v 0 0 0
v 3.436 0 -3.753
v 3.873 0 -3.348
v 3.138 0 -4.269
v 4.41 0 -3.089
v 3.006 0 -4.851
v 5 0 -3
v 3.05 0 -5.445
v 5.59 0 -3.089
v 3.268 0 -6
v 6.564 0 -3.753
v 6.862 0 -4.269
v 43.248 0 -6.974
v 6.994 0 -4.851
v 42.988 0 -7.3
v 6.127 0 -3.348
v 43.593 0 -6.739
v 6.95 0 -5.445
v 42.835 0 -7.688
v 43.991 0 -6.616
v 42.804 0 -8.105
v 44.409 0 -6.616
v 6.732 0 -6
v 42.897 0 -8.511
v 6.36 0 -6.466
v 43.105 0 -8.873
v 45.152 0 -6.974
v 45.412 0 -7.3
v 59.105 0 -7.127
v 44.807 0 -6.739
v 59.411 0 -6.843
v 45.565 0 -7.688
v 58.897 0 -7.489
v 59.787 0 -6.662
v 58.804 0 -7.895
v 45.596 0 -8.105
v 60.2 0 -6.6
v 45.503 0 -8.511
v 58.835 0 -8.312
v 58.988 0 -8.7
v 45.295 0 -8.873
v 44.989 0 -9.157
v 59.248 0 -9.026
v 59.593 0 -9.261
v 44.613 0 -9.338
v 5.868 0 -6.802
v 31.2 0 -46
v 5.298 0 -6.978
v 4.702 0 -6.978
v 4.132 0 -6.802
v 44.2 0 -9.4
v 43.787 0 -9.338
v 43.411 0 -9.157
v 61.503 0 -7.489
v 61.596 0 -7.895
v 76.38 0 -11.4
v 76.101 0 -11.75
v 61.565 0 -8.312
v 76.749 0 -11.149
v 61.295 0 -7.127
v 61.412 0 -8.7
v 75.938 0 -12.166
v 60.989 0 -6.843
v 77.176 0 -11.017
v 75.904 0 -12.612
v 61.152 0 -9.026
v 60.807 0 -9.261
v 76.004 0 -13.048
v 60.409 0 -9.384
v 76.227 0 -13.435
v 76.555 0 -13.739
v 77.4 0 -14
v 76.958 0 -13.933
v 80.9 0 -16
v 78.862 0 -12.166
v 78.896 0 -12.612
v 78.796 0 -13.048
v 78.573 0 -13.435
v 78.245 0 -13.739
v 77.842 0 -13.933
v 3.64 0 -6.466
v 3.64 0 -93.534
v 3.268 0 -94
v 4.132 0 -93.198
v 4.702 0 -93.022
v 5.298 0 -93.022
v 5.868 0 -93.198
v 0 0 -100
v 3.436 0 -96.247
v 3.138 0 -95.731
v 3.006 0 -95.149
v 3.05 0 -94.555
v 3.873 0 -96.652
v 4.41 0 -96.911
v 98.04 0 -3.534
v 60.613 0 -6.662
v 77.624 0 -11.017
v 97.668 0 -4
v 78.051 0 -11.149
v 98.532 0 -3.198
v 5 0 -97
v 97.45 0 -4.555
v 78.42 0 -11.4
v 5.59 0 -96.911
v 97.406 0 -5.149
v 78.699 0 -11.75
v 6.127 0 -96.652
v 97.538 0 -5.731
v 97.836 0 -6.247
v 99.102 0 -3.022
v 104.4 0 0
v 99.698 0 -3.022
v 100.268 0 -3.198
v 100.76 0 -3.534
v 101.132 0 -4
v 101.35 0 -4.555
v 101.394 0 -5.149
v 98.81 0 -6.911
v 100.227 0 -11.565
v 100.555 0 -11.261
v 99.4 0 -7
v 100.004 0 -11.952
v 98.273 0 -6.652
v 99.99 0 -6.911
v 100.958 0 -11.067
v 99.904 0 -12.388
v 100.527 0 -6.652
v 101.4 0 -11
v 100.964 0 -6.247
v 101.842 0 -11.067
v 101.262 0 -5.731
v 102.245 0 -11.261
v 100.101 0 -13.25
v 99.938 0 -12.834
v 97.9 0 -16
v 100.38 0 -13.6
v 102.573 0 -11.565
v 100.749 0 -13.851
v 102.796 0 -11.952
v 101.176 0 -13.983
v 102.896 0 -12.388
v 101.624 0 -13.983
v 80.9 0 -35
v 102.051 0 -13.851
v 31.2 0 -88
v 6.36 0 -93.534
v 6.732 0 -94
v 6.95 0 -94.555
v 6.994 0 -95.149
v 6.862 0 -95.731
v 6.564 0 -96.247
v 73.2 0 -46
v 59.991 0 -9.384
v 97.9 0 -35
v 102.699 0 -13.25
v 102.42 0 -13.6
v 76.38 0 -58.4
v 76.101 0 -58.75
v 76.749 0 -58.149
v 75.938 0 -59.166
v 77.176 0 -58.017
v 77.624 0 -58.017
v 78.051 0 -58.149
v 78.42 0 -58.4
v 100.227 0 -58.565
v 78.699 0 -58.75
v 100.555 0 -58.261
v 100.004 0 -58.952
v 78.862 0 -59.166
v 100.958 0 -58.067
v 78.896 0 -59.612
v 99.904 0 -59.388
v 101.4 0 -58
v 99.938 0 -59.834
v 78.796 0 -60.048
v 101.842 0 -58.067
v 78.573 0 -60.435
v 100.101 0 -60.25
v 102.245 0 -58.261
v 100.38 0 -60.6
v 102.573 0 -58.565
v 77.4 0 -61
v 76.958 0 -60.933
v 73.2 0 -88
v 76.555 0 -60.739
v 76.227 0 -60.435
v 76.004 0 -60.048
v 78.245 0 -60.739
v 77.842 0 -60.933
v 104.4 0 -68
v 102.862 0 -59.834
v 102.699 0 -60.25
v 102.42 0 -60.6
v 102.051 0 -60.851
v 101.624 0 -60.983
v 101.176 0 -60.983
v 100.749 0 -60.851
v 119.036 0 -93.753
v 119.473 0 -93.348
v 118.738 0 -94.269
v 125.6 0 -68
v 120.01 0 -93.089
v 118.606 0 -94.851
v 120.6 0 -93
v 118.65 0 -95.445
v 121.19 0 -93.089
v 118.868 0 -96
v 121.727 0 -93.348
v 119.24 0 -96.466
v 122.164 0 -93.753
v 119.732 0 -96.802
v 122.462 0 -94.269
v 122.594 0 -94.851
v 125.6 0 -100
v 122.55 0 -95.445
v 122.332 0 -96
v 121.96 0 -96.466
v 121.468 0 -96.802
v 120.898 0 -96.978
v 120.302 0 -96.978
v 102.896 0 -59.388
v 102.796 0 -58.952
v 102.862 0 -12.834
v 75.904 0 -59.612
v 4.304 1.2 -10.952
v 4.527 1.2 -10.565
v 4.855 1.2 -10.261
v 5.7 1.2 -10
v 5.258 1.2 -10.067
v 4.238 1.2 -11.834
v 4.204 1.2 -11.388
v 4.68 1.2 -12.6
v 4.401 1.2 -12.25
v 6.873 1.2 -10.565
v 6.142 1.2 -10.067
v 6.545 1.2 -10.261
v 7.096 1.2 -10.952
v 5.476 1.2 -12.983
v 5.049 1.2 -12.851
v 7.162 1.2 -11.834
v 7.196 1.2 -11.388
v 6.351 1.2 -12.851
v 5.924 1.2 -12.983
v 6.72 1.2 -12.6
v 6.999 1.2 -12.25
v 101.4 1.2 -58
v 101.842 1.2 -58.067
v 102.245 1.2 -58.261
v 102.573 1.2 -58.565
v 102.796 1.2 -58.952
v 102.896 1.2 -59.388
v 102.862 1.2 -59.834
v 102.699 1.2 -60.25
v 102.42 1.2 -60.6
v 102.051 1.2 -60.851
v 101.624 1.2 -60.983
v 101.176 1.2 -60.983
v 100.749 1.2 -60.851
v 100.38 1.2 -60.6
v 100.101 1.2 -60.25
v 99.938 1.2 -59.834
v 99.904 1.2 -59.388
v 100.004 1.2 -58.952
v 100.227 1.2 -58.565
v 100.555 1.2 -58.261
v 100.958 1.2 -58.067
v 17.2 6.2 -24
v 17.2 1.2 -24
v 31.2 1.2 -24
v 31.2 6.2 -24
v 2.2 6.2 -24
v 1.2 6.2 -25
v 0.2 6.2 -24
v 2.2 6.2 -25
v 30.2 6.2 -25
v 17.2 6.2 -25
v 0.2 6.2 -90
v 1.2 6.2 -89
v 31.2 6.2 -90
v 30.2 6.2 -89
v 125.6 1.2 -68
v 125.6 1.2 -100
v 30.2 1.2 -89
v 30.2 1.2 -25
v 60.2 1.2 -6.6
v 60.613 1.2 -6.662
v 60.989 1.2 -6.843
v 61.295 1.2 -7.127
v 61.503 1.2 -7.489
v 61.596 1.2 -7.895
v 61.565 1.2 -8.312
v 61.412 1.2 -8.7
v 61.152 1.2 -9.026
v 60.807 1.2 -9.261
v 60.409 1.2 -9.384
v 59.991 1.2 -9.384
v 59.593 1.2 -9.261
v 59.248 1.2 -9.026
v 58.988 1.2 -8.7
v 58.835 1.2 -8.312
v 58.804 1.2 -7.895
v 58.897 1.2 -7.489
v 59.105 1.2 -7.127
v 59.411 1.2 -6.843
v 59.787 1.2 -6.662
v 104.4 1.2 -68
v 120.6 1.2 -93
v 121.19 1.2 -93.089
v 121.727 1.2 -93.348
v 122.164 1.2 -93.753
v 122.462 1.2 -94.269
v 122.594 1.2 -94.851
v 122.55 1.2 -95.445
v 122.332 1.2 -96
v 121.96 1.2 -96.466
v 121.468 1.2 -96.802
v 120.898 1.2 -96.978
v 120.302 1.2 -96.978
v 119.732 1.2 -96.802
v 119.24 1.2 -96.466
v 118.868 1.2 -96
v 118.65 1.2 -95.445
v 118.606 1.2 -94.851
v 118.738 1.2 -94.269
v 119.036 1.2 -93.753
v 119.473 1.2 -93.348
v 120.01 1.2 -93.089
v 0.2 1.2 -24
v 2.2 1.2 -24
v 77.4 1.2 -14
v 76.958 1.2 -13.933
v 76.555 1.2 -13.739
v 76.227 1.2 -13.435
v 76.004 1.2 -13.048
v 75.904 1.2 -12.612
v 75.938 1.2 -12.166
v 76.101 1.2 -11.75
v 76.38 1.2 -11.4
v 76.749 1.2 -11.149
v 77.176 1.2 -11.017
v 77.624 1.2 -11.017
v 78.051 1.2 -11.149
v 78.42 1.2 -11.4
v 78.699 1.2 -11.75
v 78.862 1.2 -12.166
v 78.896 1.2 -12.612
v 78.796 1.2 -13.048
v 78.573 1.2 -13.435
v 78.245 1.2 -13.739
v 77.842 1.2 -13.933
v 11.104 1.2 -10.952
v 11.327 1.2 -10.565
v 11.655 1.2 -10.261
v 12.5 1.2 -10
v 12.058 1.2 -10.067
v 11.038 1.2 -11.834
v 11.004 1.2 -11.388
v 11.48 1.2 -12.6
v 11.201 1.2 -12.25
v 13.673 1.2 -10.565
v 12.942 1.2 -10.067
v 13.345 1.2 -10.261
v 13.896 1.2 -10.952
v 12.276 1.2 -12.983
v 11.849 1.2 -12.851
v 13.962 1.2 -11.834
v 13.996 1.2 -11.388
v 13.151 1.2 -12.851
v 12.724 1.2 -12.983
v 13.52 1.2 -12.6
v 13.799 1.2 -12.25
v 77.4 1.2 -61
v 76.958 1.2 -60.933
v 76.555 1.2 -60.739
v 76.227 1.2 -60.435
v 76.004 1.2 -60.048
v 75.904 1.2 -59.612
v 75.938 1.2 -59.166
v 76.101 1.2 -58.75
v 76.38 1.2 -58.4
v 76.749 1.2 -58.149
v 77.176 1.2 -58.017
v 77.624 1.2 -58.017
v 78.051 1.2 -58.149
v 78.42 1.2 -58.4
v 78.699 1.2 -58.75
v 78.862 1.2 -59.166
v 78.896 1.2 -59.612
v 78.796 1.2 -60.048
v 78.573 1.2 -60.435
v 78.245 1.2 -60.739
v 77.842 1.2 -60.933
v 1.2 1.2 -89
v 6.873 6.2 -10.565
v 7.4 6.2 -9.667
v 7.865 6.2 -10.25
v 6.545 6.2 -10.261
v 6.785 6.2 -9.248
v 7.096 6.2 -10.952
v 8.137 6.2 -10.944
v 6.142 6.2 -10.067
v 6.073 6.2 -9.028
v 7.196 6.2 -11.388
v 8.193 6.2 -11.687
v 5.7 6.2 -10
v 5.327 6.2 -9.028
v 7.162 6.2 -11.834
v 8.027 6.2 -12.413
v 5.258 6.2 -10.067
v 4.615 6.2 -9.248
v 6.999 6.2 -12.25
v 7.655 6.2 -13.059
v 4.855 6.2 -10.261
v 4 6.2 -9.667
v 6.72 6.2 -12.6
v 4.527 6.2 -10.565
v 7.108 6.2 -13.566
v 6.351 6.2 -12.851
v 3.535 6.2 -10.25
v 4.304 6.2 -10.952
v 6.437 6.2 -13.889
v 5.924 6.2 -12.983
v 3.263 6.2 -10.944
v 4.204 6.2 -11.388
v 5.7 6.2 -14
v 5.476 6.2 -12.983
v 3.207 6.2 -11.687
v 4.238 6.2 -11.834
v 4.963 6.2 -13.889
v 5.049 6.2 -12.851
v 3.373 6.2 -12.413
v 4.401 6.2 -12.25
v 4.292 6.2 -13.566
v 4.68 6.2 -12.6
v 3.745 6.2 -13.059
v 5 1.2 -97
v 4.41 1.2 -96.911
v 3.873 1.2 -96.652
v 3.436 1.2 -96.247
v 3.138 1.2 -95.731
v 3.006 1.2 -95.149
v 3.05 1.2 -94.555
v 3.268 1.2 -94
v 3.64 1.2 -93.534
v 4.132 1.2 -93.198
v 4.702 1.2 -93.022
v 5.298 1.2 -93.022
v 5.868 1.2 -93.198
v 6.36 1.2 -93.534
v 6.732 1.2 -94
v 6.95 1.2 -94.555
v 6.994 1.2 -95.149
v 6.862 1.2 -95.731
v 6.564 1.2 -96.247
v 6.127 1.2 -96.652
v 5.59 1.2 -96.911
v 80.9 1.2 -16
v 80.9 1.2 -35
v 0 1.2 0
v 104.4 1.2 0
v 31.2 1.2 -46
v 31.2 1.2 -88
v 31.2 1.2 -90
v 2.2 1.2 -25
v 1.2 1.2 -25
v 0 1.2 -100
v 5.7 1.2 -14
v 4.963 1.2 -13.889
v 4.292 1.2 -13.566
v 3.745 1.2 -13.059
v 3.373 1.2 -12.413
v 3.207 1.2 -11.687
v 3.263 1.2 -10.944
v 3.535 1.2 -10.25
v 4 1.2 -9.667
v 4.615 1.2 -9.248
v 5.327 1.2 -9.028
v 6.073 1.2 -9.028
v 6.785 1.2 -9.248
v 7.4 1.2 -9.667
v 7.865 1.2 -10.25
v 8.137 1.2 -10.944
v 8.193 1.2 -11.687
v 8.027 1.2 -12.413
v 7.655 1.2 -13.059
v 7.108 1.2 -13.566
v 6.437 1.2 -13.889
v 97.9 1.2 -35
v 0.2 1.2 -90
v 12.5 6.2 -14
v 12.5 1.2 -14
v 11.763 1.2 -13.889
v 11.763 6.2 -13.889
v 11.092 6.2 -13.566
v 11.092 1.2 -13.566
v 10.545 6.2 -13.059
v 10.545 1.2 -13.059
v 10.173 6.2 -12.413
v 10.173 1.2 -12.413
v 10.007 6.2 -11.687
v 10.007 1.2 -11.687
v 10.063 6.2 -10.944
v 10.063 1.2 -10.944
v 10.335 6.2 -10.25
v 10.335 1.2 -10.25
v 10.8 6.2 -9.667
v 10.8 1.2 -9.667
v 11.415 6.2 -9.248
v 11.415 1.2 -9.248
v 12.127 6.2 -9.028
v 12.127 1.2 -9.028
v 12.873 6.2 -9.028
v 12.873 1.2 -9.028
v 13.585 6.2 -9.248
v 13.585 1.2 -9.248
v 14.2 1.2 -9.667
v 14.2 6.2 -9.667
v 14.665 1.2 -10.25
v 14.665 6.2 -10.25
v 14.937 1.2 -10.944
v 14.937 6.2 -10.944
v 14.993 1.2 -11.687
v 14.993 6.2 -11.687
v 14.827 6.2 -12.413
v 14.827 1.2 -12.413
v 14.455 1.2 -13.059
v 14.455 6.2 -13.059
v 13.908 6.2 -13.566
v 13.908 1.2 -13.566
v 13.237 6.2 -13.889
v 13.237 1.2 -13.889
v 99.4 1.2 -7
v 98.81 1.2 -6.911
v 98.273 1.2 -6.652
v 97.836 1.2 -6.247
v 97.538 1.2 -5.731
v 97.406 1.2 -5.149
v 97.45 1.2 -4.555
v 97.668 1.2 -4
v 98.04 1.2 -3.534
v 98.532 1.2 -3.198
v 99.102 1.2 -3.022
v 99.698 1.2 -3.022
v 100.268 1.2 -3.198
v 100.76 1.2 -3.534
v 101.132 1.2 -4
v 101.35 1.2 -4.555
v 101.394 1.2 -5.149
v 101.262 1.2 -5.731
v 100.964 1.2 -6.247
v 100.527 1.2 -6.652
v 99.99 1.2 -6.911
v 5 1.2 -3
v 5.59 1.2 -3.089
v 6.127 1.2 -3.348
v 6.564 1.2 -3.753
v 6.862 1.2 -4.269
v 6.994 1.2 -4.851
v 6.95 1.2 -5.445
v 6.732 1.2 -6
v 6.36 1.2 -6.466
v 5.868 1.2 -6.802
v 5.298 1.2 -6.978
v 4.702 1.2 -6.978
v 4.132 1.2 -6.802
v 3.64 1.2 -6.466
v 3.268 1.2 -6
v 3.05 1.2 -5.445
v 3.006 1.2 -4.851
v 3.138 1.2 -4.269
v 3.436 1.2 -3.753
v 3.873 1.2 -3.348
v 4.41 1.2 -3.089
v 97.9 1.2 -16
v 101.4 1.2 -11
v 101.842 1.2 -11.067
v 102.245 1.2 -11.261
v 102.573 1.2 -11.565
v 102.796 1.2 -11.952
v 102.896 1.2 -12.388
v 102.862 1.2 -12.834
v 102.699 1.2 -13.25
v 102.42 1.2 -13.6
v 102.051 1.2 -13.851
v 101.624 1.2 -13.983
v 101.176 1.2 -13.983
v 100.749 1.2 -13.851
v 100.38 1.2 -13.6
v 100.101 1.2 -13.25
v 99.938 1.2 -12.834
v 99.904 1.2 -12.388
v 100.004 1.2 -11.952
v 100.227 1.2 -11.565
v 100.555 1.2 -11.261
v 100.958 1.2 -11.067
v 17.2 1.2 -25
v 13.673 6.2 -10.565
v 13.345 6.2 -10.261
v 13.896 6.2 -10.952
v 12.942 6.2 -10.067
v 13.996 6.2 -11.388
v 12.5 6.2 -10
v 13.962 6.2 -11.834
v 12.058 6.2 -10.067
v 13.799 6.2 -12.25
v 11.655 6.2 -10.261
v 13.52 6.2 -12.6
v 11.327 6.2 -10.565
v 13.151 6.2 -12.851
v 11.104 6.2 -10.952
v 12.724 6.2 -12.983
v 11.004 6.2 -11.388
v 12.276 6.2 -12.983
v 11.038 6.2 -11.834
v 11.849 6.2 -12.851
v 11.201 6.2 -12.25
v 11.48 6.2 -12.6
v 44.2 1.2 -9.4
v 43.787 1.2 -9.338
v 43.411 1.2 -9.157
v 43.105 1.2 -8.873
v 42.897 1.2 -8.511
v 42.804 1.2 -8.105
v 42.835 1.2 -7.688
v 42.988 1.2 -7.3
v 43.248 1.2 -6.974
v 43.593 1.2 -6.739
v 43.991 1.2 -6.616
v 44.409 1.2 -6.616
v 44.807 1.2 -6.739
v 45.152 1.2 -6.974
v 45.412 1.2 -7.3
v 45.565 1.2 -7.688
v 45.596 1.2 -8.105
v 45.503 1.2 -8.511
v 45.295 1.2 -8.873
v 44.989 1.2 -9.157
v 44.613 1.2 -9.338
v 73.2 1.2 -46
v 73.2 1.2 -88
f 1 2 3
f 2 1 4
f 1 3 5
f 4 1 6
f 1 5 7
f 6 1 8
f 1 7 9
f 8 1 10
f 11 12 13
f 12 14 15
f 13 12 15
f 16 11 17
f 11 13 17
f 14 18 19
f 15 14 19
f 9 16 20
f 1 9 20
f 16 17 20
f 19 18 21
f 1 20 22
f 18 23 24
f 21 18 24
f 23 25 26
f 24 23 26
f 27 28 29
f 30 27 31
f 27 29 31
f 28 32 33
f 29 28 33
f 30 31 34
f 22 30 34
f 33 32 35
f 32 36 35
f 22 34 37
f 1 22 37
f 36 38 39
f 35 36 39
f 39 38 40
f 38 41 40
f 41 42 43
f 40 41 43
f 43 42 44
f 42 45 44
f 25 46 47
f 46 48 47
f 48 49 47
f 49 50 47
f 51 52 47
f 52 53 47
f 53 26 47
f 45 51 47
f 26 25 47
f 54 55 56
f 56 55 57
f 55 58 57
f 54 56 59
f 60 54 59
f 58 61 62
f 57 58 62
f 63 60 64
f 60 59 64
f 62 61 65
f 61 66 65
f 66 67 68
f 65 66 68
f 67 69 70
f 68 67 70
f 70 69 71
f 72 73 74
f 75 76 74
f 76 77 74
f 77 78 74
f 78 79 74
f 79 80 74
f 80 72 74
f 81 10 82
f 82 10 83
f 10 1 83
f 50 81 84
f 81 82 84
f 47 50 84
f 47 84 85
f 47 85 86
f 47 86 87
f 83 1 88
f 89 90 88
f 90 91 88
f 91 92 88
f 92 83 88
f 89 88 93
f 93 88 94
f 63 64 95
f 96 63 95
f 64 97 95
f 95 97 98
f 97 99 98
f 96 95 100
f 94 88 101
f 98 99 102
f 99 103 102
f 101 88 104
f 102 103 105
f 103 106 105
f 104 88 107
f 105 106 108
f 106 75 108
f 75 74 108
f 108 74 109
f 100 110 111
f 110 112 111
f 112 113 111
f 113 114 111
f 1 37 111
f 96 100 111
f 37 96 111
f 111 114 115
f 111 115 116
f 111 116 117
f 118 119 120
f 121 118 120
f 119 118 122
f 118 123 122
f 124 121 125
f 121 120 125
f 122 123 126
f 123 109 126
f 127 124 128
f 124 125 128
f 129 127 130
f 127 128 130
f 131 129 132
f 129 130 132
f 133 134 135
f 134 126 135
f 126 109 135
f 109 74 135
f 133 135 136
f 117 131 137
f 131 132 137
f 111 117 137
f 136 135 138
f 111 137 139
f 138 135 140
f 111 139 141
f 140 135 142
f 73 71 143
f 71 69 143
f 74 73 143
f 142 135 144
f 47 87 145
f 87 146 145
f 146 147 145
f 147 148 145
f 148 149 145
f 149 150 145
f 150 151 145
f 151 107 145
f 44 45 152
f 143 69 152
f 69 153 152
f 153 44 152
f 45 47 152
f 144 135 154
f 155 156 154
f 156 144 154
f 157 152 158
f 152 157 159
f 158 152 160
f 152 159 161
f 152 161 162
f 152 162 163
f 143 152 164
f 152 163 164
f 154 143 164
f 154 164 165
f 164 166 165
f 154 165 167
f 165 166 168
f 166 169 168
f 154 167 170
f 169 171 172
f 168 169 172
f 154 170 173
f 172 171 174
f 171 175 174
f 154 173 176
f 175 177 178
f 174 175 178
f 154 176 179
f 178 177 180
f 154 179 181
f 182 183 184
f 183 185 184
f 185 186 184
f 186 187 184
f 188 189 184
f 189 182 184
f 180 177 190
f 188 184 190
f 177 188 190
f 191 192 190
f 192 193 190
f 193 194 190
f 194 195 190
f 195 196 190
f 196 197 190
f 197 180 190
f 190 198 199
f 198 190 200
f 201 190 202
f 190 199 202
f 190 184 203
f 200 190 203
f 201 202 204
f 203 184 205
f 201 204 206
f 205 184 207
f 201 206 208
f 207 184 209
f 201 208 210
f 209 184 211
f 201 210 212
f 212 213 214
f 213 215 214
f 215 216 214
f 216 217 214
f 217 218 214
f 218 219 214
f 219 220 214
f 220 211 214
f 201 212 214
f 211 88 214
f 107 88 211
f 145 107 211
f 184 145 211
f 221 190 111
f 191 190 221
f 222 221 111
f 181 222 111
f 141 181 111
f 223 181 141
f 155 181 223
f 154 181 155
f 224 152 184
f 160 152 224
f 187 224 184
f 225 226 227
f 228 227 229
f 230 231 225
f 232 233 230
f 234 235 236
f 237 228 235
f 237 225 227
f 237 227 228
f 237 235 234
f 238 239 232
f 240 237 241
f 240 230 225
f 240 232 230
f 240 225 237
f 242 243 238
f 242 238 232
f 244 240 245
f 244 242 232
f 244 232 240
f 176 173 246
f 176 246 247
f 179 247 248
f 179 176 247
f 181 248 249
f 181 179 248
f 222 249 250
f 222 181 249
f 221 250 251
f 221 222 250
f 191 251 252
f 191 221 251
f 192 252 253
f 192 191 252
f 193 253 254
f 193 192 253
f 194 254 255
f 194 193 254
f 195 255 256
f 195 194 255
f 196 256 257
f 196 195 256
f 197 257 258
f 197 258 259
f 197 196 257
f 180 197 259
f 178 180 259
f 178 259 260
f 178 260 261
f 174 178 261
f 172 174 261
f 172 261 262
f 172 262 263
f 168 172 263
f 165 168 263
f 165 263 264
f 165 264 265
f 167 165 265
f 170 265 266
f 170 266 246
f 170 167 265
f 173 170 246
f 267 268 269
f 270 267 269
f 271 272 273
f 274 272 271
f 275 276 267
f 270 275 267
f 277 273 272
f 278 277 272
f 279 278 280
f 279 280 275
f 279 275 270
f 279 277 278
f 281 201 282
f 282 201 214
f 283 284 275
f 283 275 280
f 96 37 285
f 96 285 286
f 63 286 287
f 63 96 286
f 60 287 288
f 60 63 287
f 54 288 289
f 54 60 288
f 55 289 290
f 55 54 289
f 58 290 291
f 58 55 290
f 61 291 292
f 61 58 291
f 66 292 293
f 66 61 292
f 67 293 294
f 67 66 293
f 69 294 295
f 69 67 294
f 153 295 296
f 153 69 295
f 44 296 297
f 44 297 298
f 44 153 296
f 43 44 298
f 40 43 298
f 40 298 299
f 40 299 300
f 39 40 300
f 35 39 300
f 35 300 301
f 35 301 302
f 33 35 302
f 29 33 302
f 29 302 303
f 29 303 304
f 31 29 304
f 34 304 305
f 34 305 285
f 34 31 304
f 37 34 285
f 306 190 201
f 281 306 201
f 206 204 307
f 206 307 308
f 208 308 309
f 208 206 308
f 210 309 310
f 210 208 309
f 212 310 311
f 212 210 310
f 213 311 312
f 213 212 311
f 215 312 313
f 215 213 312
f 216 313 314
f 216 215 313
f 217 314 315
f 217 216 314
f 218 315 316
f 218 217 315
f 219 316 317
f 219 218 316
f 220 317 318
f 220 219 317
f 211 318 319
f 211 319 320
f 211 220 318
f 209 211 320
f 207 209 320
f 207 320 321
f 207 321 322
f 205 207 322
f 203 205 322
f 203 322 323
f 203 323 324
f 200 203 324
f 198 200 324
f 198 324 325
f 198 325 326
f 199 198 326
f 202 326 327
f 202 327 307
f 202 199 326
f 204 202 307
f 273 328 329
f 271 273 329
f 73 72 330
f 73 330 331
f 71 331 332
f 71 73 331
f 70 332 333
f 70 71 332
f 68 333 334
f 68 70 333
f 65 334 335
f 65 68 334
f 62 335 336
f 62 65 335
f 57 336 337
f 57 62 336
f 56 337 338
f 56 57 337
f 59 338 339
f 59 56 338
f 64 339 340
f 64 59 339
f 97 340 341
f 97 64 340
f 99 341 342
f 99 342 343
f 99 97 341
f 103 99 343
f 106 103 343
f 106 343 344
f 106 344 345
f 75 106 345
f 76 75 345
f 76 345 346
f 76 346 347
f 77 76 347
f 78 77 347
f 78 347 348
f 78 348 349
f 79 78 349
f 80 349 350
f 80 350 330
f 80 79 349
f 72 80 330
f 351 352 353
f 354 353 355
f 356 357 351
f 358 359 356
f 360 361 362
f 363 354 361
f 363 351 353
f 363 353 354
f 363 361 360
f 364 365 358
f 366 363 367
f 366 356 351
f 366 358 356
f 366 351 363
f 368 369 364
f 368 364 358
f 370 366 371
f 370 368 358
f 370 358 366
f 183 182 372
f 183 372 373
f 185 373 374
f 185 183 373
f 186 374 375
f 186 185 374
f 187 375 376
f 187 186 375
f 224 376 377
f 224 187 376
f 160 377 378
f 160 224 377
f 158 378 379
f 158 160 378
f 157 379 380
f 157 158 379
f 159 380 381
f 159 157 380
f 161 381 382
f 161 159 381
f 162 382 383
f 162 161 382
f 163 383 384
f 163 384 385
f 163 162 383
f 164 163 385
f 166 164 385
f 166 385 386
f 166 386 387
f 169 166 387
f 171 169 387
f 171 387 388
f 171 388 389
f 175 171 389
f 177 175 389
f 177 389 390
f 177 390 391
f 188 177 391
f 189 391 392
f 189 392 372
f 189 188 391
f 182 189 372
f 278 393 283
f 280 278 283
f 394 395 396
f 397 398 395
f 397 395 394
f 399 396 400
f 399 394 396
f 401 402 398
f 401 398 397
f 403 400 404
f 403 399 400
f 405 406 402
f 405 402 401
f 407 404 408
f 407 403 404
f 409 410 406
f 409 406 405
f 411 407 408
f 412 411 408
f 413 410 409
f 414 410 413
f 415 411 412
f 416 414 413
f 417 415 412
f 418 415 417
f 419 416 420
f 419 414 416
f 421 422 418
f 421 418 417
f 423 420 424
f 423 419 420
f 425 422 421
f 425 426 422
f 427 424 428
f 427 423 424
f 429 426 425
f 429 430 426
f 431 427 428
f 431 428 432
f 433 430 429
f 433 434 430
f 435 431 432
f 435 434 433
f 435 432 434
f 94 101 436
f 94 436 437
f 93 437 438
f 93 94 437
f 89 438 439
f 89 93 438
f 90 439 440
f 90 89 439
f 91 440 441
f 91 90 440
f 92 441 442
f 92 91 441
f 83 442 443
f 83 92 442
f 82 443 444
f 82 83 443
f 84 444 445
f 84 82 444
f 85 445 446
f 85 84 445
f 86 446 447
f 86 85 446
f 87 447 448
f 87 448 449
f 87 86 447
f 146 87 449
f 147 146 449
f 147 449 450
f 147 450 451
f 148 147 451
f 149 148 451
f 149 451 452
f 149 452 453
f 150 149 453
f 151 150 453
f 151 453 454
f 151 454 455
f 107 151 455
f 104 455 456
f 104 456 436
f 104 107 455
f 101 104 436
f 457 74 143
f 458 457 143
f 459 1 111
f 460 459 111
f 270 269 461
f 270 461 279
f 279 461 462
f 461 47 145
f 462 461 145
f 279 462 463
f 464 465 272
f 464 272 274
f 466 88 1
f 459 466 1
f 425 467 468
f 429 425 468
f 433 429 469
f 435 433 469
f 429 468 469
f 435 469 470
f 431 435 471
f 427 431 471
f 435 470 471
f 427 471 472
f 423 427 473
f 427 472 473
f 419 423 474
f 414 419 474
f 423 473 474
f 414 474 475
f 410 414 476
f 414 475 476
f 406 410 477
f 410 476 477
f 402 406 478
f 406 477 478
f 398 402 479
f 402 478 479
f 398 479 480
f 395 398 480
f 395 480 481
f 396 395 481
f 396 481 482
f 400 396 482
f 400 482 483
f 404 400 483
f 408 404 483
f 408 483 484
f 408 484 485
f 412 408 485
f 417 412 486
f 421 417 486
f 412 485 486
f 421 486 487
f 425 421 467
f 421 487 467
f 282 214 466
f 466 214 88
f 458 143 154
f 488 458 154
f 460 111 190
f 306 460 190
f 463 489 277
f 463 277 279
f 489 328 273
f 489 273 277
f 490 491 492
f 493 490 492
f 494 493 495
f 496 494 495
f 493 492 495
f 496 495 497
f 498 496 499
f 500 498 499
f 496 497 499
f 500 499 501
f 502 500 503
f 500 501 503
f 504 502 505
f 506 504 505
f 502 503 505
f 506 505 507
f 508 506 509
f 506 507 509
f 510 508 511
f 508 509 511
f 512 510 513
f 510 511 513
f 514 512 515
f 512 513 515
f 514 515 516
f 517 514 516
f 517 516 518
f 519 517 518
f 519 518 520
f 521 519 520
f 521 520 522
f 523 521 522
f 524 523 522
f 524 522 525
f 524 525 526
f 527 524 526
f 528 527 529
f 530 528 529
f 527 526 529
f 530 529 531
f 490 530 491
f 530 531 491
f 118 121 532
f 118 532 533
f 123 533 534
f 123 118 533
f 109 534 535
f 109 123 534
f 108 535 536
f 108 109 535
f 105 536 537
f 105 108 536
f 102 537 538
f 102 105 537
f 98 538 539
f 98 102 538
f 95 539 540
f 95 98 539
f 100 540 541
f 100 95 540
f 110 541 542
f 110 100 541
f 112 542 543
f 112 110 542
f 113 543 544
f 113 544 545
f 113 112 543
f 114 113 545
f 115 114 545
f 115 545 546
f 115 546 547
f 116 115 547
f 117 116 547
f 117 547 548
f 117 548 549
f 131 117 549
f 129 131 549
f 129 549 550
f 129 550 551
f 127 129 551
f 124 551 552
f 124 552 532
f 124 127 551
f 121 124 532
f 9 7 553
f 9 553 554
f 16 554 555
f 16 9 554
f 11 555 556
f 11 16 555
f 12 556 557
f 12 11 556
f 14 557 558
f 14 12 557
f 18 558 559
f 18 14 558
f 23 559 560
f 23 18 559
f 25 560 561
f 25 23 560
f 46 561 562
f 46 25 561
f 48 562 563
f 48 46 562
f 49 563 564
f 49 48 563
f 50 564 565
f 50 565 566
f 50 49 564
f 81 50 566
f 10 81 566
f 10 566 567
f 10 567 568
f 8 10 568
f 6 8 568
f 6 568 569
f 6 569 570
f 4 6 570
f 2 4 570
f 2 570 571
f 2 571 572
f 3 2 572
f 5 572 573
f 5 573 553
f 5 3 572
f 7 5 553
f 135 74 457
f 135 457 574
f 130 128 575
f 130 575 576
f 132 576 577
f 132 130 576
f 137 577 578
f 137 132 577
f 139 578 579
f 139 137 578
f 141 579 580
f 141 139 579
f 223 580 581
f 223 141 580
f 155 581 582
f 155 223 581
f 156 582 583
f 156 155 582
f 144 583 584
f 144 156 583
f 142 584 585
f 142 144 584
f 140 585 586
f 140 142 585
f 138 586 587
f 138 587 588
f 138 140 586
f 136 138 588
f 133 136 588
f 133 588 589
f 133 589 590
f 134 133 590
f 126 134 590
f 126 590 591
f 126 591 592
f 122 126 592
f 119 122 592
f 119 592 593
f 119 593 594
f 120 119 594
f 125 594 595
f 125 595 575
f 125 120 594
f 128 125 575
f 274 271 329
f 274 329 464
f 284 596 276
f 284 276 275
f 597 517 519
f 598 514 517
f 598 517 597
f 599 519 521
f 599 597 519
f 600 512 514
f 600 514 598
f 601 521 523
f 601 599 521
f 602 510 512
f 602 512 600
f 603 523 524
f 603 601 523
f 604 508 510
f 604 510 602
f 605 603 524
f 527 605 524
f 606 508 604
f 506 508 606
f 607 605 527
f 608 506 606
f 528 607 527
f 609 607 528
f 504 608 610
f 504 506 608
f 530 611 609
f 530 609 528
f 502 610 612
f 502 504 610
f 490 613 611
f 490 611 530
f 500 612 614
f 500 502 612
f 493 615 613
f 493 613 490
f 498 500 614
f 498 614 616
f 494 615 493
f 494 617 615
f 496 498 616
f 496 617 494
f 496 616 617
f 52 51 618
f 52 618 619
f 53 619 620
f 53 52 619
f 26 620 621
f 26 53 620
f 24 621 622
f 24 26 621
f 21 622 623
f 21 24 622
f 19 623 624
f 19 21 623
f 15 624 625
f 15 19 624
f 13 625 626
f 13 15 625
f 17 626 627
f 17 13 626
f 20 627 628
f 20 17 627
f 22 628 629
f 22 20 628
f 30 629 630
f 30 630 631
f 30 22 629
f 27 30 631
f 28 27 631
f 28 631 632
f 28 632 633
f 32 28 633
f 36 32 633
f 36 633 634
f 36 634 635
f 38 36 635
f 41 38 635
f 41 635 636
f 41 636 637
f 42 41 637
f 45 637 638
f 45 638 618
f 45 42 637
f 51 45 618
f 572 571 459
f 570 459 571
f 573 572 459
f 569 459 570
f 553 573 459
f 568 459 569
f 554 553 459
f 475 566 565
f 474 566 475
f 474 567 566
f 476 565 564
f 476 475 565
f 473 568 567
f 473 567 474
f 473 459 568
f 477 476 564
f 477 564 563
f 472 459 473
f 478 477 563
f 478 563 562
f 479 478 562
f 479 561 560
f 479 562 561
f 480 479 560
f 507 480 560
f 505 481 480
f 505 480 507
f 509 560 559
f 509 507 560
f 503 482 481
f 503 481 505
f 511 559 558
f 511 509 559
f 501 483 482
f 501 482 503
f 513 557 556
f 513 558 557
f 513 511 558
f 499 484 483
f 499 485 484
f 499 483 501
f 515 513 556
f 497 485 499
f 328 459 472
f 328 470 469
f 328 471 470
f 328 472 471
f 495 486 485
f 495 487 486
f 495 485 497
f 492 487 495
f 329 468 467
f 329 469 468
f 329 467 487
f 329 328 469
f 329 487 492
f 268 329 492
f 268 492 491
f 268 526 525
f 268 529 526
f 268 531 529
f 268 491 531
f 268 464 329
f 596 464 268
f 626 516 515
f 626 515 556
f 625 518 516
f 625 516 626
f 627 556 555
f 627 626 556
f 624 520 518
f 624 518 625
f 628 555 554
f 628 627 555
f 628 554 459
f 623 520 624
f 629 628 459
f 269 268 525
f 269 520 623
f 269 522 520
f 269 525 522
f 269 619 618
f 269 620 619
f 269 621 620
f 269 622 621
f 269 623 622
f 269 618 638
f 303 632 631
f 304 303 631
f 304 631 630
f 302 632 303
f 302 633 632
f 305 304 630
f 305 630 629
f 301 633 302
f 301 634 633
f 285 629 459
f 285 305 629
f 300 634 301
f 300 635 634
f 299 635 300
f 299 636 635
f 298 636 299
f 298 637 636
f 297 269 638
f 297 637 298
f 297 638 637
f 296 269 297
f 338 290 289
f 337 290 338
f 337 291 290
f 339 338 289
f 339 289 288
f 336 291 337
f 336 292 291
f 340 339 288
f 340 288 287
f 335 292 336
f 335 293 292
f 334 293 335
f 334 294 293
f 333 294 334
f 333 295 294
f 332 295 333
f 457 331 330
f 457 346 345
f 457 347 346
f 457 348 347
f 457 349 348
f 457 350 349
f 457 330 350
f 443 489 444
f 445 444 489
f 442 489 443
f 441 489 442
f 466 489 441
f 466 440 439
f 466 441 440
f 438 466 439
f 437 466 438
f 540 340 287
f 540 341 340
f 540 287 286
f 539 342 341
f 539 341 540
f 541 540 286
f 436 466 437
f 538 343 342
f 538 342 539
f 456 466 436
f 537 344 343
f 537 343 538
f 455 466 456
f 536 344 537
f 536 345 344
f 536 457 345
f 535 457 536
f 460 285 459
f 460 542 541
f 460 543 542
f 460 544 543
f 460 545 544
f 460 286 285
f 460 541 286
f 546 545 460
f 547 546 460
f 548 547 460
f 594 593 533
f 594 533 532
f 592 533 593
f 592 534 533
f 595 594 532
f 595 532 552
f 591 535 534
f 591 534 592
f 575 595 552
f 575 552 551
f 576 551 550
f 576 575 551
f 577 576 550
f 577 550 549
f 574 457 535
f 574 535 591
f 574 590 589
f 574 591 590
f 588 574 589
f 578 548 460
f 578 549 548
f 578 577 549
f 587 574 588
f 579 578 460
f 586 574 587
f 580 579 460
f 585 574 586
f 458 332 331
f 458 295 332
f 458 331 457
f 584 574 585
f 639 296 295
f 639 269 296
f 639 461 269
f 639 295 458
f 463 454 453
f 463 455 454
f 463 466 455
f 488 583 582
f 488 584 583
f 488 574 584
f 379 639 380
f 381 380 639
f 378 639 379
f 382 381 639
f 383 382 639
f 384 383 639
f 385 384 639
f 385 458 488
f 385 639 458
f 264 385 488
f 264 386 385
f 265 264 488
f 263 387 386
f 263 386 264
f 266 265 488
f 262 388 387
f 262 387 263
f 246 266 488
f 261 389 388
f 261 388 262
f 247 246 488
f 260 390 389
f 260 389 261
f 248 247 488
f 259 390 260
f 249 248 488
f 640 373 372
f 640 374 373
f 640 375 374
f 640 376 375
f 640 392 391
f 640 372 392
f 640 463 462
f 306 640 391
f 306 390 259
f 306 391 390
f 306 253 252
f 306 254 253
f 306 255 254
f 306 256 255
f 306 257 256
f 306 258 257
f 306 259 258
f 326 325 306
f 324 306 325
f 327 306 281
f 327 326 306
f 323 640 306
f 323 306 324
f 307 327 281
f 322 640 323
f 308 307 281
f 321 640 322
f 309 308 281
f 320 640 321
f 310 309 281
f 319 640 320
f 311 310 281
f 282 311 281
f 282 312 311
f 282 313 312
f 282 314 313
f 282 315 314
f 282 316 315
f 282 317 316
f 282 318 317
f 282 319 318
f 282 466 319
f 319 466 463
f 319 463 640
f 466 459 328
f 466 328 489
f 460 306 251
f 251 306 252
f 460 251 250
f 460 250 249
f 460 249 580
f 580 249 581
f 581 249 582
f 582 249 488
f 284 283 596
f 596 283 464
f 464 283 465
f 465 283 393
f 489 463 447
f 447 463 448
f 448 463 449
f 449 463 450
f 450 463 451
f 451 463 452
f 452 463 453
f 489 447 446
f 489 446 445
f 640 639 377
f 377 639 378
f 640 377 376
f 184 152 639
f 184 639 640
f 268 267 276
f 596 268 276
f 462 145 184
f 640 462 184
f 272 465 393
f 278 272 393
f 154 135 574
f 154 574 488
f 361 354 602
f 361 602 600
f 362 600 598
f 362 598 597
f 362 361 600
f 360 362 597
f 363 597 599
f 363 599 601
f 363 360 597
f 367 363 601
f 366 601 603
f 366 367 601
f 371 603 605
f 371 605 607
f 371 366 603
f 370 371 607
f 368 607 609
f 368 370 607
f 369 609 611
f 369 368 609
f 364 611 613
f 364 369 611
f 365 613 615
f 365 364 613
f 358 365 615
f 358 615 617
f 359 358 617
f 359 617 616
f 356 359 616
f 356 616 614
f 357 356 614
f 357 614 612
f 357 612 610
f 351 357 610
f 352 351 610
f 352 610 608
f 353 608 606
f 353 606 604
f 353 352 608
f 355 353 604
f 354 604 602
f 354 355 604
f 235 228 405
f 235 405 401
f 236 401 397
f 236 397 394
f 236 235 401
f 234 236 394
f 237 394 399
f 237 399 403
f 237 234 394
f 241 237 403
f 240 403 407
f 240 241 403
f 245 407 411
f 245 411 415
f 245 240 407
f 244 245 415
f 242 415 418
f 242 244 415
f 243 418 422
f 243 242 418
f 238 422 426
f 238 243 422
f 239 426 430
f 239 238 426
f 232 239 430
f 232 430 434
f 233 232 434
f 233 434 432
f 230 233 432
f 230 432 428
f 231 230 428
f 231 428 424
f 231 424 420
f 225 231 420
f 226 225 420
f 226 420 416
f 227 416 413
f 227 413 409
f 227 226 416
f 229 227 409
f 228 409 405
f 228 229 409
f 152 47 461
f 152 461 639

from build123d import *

# Parameters (mm, degrees)
SKETCH_1_R          = 2
SKETCH_1_R_2        = 1.5
SKETCH_1_R_3        = 1.4
SKETCH_1_W          = 42
SKETCH_1_H          = 42
SKETCH_1_W_2        = 17
SKETCH_1_H_2        = 19
EXTRUDE_1_DEPTH     = 1.2
SKETCH_2_R          = 2.5
SKETCH_2_R_2        = 1.5
SKETCH_2_W          = 31
SKETCH_2_H          = 66
SKETCH_2_W_2        = 29
SKETCH_2_H_2        = 64
EXTRUDE_2_DEPTH     = 5
SKETCH_3_W          = 15
SKETCH_3_H          = 3
CUT_EXTRUDE_1_DEPTH = 5


with BuildPart() as part:
    # 草图1 → 凸台-拉伸1 (new body)
    with BuildSketch(Plane(origin=(0, 0, 0), x_dir=(1, 0, 0), z_dir=(0, 1, 0))):
        Polygon((104.4, 68), (125.6, 68), (125.6, 100), (0, 100), (0, 0), (104.4, 0), align=None)
        with Locations(Location((5, 5, 0), (0, 0, 270))):
            Circle(SKETCH_1_R, mode=Mode.SUBTRACT)
        with Locations(Location((5, 95, 0), (0, 0, 90))):
            Circle(SKETCH_1_R, mode=Mode.SUBTRACT)
        with Locations(Location((120.6, 95, 0), (0, 0, 270))):
            Circle(SKETCH_1_R, mode=Mode.SUBTRACT)
        with Locations(Location((99.4, 5, 0), (0, 0, 90))):
            Circle(SKETCH_1_R, mode=Mode.SUBTRACT)
        with Locations(Location((101.4, 12.5, 0), (0, 0, 270))):
            Circle(SKETCH_1_R_2, mode=Mode.SUBTRACT)
        with Locations(Location((77.4, 12.5, 0), (0, 0, 90))):
            Circle(SKETCH_1_R_2, mode=Mode.SUBTRACT)
        with Locations(Location((101.4, 59.5, 0), (0, 0, 270))):
            Circle(SKETCH_1_R_2, mode=Mode.SUBTRACT)
        with Locations(Location((77.4, 59.5, 0), (0, 0, 90))):
            Circle(SKETCH_1_R_2, mode=Mode.SUBTRACT)
        with Locations(Location((60.2, 8, 0), (0, 0, 270))):
            Circle(SKETCH_1_R_3, mode=Mode.SUBTRACT)
        with Locations(Location((44.2, 8, 0), (0, 0, 90))):
            Circle(SKETCH_1_R_3, mode=Mode.SUBTRACT)
        with Locations((52.2, 67)):
            Rectangle(SKETCH_1_W, SKETCH_1_H, mode=Mode.SUBTRACT)
        with Locations((89.4, 25.5)):
            Rectangle(SKETCH_1_W_2, SKETCH_1_H_2, mode=Mode.SUBTRACT)
    extrude(amount=EXTRUDE_1_DEPTH)

    # 草图2 → 凸台-拉伸2 (add)
    # profile 1 of 3: a face of its own
    with BuildSketch(Plane(origin=(0, 1.2, 0), x_dir=(1, 0, 0), z_dir=(0, 1, 0))):
        with Locations(Location((12.5, 11.5, 0), (0, 0, 90))):
            Circle(SKETCH_2_R)
        with Locations(Location((12.5, 11.5, 0), (0, 0, 270))):
            Circle(SKETCH_2_R_2, mode=Mode.SUBTRACT)
    # profile 2 of 3: a face of its own
    with BuildSketch(Plane(origin=(0, 1.2, 0), x_dir=(1, 0, 0), z_dir=(0, 1, 0))):
        with Locations(Location((5.7, 11.5, 0), (0, 0, 90))):
            Circle(SKETCH_2_R)
        with Locations(Location((5.7, 11.5, 0), (0, 0, 270))):
            Circle(SKETCH_2_R_2, mode=Mode.SUBTRACT)
    # profile 3 of 3: a face of its own
    with BuildSketch(Plane(origin=(0, 1.2, 0), x_dir=(1, 0, 0), z_dir=(0, 1, 0))):
        with Locations((15.7, 57)):
            Rectangle(SKETCH_2_W, SKETCH_2_H)
        with Locations((15.7, 57)):
            Rectangle(SKETCH_2_W_2, SKETCH_2_H_2, mode=Mode.SUBTRACT)
    extrude(amount=EXTRUDE_2_DEPTH)

    # 草图3 → 切除-拉伸1 (cut)
    with BuildSketch(Plane(origin=(0, 6.2, 0), x_dir=(1, 0, 0), z_dir=(0, 1, 0))):
        with Locations((9.7, 25.5)):
            Rectangle(SKETCH_3_W, SKETCH_3_H)
    extrude(amount=-CUT_EXTRUDE_1_DEPTH, mode=Mode.SUBTRACT)


solid = part.part
